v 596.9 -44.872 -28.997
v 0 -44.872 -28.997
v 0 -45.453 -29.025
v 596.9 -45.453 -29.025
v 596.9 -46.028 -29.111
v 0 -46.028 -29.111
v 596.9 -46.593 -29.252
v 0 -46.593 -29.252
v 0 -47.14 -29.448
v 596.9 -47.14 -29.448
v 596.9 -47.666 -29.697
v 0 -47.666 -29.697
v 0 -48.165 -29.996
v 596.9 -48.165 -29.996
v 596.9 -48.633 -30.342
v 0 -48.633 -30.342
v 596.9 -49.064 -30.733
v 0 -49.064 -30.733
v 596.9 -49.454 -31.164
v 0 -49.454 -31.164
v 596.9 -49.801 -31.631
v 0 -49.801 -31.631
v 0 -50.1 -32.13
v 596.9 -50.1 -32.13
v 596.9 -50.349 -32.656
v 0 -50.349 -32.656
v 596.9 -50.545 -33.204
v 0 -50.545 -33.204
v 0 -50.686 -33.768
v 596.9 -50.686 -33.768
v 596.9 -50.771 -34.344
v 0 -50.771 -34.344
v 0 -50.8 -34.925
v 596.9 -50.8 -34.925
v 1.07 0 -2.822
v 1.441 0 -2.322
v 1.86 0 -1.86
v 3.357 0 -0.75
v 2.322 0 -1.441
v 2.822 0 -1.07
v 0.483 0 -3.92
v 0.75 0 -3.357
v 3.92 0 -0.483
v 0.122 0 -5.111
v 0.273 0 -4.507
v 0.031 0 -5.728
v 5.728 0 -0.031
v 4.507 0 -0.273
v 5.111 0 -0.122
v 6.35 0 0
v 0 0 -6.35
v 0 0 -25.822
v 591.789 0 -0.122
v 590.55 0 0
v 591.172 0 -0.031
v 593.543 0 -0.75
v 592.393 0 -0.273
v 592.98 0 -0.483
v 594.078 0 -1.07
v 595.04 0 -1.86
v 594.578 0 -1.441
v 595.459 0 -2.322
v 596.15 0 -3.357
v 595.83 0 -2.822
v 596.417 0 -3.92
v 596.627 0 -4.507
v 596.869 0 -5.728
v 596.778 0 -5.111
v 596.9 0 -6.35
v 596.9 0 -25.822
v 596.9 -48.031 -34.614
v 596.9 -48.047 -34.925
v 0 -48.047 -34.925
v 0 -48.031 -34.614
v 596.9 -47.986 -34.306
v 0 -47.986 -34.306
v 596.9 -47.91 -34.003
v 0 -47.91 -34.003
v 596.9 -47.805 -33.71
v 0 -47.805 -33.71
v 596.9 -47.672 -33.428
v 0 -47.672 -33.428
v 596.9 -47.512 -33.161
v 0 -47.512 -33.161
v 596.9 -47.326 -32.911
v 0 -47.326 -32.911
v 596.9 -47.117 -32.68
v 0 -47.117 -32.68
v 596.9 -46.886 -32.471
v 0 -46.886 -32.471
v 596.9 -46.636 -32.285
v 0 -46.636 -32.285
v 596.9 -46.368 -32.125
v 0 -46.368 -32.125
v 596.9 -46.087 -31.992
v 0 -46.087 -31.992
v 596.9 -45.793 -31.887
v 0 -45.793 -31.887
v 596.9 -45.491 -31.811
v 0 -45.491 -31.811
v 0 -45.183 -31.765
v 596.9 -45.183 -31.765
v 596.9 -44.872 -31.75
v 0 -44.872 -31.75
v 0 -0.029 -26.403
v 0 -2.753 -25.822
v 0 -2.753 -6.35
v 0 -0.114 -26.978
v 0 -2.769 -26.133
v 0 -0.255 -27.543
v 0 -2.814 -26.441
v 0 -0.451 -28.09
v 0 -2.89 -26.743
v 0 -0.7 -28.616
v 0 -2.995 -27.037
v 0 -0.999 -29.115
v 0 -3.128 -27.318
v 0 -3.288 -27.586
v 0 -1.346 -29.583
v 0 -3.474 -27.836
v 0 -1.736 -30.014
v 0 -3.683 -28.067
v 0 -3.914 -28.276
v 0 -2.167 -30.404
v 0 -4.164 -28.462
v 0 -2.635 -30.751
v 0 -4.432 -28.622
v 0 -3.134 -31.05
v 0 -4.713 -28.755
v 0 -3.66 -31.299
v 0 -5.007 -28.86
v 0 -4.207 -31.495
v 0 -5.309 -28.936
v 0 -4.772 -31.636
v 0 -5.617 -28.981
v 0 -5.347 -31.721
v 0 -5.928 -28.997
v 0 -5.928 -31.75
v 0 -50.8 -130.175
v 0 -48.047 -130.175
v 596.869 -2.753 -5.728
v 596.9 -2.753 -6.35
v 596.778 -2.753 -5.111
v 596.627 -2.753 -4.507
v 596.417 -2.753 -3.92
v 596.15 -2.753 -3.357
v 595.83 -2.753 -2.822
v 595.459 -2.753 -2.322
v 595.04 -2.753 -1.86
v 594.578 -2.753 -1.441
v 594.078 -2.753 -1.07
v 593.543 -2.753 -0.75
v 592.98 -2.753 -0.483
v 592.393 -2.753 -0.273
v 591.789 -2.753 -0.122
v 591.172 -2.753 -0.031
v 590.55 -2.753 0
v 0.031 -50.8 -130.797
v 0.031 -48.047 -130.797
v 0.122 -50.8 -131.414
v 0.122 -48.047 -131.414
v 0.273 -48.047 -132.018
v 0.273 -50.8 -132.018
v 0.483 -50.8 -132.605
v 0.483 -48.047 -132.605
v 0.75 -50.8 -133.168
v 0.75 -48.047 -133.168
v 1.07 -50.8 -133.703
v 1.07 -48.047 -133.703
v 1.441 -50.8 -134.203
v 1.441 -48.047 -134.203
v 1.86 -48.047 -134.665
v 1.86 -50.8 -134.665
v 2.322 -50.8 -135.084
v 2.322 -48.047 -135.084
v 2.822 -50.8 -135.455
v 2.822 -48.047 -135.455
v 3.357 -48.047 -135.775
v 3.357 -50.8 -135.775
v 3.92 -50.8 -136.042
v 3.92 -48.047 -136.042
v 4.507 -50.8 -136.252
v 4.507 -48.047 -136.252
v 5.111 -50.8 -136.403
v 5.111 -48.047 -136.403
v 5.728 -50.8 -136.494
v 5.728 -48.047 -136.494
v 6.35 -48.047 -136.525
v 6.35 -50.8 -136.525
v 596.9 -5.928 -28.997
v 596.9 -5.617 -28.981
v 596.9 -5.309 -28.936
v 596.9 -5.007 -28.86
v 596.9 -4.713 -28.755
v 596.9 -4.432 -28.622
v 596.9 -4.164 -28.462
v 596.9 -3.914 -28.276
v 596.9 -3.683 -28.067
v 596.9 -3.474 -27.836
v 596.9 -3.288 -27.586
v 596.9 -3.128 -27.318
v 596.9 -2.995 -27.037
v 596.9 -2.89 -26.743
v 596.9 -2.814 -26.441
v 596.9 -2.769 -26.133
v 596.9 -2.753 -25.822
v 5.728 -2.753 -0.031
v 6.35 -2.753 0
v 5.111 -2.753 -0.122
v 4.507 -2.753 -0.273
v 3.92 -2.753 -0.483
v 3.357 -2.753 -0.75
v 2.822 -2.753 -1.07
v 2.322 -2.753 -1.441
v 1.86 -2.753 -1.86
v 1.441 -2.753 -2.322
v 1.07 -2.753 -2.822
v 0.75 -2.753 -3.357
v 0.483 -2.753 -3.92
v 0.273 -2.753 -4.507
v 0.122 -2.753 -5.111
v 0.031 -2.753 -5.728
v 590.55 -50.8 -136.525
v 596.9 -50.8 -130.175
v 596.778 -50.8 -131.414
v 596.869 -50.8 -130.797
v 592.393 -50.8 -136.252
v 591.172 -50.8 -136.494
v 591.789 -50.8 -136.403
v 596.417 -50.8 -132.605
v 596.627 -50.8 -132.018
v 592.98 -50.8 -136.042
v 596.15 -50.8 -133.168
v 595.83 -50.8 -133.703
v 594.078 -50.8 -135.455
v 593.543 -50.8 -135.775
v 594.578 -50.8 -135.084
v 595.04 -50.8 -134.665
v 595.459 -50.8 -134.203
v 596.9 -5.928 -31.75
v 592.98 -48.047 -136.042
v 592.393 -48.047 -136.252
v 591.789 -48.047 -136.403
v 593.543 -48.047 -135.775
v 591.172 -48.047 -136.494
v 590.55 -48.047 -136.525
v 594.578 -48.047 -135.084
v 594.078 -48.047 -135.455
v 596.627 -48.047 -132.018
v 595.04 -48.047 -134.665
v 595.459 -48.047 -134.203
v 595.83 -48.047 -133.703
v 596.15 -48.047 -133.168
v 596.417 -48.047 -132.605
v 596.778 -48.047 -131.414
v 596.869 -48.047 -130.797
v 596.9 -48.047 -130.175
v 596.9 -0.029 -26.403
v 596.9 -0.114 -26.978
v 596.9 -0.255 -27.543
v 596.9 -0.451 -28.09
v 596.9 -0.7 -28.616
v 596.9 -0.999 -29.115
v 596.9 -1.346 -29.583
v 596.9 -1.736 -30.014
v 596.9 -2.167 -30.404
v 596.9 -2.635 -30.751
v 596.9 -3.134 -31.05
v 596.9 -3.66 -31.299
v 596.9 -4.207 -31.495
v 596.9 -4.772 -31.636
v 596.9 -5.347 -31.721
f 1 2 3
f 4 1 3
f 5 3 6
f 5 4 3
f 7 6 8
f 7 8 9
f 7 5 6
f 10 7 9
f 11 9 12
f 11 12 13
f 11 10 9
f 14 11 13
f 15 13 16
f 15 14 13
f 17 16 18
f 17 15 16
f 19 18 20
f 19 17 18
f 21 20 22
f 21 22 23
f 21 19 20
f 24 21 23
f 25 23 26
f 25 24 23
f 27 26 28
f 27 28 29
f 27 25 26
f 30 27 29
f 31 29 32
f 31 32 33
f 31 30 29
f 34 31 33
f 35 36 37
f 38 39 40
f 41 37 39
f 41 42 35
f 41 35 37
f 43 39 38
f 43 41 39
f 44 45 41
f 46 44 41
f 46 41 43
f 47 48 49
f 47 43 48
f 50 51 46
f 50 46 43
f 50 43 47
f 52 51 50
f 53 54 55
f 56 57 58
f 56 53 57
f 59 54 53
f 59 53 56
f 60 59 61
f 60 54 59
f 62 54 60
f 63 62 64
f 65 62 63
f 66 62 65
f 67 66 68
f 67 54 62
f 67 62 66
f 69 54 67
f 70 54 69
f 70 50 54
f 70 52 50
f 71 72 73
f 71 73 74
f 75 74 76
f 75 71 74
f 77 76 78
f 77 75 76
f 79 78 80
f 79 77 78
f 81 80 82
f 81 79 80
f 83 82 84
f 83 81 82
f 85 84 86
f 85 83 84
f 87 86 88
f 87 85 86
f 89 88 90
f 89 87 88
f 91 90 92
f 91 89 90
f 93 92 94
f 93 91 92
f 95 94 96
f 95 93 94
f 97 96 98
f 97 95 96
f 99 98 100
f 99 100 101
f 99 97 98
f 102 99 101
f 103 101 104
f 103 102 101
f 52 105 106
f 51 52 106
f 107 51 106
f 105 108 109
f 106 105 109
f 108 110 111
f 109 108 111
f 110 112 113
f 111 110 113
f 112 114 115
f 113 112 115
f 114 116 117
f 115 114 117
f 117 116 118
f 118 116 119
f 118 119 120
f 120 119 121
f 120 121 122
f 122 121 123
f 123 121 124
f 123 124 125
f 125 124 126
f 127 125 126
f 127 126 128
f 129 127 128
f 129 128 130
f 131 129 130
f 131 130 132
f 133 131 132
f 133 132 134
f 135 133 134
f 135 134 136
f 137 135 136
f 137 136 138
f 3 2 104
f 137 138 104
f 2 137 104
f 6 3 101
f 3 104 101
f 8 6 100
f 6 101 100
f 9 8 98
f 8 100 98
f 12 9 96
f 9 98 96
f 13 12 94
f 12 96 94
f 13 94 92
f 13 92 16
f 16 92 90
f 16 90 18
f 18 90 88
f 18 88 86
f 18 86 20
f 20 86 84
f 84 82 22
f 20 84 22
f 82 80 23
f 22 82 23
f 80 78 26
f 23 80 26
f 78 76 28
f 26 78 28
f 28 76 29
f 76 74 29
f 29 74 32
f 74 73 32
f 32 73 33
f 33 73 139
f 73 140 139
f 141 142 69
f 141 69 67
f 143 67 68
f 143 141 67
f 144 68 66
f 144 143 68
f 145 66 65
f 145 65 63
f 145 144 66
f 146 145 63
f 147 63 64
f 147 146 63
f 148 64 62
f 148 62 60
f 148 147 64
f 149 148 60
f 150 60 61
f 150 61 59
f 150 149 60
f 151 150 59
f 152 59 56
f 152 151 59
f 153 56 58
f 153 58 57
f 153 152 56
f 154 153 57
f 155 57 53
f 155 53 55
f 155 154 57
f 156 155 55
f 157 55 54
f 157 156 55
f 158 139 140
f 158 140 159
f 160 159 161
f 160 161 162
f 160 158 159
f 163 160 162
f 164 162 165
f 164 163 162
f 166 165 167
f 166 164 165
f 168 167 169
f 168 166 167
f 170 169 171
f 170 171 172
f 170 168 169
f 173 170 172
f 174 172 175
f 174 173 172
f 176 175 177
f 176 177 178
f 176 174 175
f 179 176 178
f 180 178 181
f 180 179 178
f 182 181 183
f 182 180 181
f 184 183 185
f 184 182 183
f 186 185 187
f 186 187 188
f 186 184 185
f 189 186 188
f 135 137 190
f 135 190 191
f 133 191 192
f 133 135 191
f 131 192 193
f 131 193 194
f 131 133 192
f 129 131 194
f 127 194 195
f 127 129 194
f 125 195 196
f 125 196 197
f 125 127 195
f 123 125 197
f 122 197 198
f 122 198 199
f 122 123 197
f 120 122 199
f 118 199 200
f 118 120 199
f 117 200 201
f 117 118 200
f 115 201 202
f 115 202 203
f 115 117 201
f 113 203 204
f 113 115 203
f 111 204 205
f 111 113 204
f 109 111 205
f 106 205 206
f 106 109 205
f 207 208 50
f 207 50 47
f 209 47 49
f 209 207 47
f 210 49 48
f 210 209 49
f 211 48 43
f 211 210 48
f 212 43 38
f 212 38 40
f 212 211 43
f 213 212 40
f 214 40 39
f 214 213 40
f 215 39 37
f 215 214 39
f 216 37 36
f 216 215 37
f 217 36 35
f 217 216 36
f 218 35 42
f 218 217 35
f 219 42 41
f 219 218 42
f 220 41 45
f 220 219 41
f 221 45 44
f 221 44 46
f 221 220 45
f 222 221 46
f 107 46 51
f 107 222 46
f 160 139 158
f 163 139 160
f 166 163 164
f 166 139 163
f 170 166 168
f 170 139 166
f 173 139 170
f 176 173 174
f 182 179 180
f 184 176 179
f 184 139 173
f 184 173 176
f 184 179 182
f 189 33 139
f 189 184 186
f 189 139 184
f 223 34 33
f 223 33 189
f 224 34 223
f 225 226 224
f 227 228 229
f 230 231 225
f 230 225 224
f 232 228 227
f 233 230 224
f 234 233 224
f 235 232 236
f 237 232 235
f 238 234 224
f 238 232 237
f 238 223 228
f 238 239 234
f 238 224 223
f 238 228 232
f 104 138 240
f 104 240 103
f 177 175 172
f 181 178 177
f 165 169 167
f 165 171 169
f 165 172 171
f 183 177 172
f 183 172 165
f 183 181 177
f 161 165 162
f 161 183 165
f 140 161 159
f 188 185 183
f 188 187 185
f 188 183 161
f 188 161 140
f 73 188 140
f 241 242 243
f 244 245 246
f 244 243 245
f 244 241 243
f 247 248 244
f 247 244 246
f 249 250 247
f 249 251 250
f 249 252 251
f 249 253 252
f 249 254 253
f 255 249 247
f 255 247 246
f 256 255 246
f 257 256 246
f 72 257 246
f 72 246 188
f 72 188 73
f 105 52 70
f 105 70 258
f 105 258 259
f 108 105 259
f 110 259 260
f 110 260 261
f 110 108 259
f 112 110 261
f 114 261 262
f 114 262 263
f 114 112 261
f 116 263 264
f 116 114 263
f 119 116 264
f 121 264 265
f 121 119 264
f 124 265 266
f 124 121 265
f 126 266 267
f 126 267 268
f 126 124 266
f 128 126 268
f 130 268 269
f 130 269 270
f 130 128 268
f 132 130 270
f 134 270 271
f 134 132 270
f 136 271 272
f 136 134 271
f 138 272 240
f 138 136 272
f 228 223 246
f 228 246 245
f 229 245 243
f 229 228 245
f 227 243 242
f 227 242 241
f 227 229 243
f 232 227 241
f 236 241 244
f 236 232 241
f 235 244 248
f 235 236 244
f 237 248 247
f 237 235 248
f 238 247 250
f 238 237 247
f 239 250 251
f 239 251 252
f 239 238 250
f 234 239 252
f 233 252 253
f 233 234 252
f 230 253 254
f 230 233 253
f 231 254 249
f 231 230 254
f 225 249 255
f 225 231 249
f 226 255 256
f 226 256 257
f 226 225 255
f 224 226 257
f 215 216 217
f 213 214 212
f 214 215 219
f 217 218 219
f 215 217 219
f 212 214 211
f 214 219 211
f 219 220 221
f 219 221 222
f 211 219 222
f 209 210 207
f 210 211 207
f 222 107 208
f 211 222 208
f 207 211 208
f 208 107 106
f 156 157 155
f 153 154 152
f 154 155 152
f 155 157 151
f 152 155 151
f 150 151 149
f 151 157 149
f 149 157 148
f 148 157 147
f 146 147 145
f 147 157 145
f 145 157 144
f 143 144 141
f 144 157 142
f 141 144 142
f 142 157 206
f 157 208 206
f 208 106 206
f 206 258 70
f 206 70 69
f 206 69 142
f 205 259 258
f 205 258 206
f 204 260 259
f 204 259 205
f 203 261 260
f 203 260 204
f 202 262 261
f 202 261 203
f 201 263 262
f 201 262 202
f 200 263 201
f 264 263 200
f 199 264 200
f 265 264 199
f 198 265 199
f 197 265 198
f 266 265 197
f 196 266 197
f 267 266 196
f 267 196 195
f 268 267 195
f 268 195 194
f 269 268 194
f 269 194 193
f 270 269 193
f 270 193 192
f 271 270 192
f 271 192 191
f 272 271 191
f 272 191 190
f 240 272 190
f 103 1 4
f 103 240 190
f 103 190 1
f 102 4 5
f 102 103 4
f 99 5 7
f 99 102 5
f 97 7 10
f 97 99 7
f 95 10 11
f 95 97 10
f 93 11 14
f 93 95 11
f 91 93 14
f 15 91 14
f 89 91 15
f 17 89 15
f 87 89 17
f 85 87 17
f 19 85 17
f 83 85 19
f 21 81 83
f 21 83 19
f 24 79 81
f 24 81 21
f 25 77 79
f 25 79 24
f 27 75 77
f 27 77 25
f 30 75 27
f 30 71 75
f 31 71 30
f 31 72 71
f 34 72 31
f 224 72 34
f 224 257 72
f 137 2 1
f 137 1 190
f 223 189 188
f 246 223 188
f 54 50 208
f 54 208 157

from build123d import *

# Parameters (mm, degrees)
SKETCH1_W                    = 596.9
SKETCH1_H                    = 31.75
BASE_FLANGE1_DEPTH           = 2.75336
EDGE_FLANGE1_STRIP_W         = 17.36344
EDGE_FLANGE1_STRIP_H         = 2.75336
EDGE_FLANGE1_STRIP_CUT_DEPTH = 596.9
EDGE_FLANGE1_DEPTH           = 596.9
EDGE_FLANGE2_STRIP_W         = 17.36344
EDGE_FLANGE2_STRIP_H         = 2.75336
EDGE_FLANGE2_STRIP_CUT_DEPTH = 596.9
EDGE_FLANGE2_DEPTH           = 596.9
BREAK_CORNER1_START          = -50.8
BREAK_CORNER1_DEPTH          = 50.8


# Read off the part's stored shape, not the designer's step: Break-Corner1
# Sheet-metal steps are written as plain solids
with BuildPart() as part:
    # Sketch1 → Base-Flange1 (new body)
    with BuildSketch(Plane(origin=(0, 0, 0), x_dir=(1, 0, 0), z_dir=(0, 1, 0))):
        with Locations((298.45, 15.875)):
            Rectangle(SKETCH1_W, SKETCH1_H)
    extrude(amount=-BASE_FLANGE1_DEPTH)

    # Edge-Flange1 strip (across the edge) → Edge-Flange1 strip cut (cut)
    with BuildSketch(Plane(origin=(0, -2.75336, -31.75), x_dir=(0, 0, 1), z_dir=(1, 0, 0))):
        with Locations((-2.75336, -1.37668)):
            Rectangle(EDGE_FLANGE1_STRIP_W, EDGE_FLANGE1_STRIP_H)
    extrude(amount=EDGE_FLANGE1_STRIP_CUT_DEPTH, mode=Mode.SUBTRACT)

    # Edge-Flange1 section (across the edge) → Edge-Flange1 (add)
    with BuildSketch(Plane(origin=(0, -2.75336, -31.75), x_dir=(0, 0, 1), z_dir=(1, 0, 0))):
        with BuildLine():
            Line((0, 3.175), (0, 48.04664))
            Line((0, 48.04664), (2.75336, 48.04664))
            Line((2.75336, 48.04664), (2.75336, 3.175))
            ThreePointArc((2.75336, 3.175), (3.68329597, 0.92993597), (5.92836, 0))
            Line((5.92836, 0), (5.92836, -2.75336))
            ThreePointArc((5.92836, -2.75336), (1.736376443, -1.016983557), (0, 3.175))
        make_face()
    extrude(amount=EDGE_FLANGE1_DEPTH)

    # Edge-Flange2 strip (across the edge) → Edge-Flange2 strip cut (cut)
    with BuildSketch(Plane(origin=(596.9, -50.8, -31.75), x_dir=(0, 1, 0), z_dir=(-1, 0, 0))):
        with Locations((-2.75336, -1.37668)):
            Rectangle(EDGE_FLANGE2_STRIP_W, EDGE_FLANGE2_STRIP_H)
    extrude(amount=EDGE_FLANGE2_STRIP_CUT_DEPTH, mode=Mode.SUBTRACT)

    # Edge-Flange2 section (across the edge) → Edge-Flange2 (add)
    with BuildSketch(Plane(origin=(596.9, -50.8, -31.75), x_dir=(0, 1, 0), z_dir=(-1, 0, 0))):
        with BuildLine():
            Line((0, 3.175), (0, 104.775))
            Line((0, 104.775), (2.75336, 104.775))
            Line((2.75336, 104.775), (2.75336, 3.175))
            ThreePointArc((2.75336, 3.175), (3.68329597, 0.92993597), (5.92836, 0))
            Line((5.92836, 0), (5.92836, -2.75336))
            ThreePointArc((5.92836, -2.75336), (1.736376443, -1.016983557), (0, 3.175))
        make_face()
    extrude(amount=EDGE_FLANGE2_DEPTH)

    # Break-Corner1 outline → Break-Corner1 (cut)
    with BuildSketch(Plane(origin=(0, 0, 0), x_dir=(1, 0, 0), z_dir=(0, 1, 0)).offset(BREAK_CORNER1_START)):
        with BuildLine():
            Line((0, 0), (6.35, 0))
            ThreePointArc((6.35, 0), (1.859871939, 1.859871939), (0, 6.35))
            Line((0, 6.35), (0, 0))
        make_face()
        with BuildLine():
            ThreePointArc((596.9, 6.35), (595.040128061, 1.859871939), (590.55, 0))
            Line((590.55, 0), (596.9, 0))
            Line((596.9, 0), (596.9, 6.35))
        make_face()
        with BuildLine():
            ThreePointArc((0, 130.175), (1.859871939, 134.665128061), (6.35, 136.525))
            Line((6.35, 136.525), (0, 136.525))
            Line((0, 136.525), (0, 130.175))
        make_face()
        with BuildLine():
            ThreePointArc((590.55, 136.525), (595.040128061, 134.665128061), (596.9, 130.175))
            Line((596.9, 130.175), (596.9, 136.525))
            Line((596.9, 136.525), (590.55, 136.525))
        make_face()
    extrude(amount=BREAK_CORNER1_DEPTH, mode=Mode.SUBTRACT)


solid = part.part
